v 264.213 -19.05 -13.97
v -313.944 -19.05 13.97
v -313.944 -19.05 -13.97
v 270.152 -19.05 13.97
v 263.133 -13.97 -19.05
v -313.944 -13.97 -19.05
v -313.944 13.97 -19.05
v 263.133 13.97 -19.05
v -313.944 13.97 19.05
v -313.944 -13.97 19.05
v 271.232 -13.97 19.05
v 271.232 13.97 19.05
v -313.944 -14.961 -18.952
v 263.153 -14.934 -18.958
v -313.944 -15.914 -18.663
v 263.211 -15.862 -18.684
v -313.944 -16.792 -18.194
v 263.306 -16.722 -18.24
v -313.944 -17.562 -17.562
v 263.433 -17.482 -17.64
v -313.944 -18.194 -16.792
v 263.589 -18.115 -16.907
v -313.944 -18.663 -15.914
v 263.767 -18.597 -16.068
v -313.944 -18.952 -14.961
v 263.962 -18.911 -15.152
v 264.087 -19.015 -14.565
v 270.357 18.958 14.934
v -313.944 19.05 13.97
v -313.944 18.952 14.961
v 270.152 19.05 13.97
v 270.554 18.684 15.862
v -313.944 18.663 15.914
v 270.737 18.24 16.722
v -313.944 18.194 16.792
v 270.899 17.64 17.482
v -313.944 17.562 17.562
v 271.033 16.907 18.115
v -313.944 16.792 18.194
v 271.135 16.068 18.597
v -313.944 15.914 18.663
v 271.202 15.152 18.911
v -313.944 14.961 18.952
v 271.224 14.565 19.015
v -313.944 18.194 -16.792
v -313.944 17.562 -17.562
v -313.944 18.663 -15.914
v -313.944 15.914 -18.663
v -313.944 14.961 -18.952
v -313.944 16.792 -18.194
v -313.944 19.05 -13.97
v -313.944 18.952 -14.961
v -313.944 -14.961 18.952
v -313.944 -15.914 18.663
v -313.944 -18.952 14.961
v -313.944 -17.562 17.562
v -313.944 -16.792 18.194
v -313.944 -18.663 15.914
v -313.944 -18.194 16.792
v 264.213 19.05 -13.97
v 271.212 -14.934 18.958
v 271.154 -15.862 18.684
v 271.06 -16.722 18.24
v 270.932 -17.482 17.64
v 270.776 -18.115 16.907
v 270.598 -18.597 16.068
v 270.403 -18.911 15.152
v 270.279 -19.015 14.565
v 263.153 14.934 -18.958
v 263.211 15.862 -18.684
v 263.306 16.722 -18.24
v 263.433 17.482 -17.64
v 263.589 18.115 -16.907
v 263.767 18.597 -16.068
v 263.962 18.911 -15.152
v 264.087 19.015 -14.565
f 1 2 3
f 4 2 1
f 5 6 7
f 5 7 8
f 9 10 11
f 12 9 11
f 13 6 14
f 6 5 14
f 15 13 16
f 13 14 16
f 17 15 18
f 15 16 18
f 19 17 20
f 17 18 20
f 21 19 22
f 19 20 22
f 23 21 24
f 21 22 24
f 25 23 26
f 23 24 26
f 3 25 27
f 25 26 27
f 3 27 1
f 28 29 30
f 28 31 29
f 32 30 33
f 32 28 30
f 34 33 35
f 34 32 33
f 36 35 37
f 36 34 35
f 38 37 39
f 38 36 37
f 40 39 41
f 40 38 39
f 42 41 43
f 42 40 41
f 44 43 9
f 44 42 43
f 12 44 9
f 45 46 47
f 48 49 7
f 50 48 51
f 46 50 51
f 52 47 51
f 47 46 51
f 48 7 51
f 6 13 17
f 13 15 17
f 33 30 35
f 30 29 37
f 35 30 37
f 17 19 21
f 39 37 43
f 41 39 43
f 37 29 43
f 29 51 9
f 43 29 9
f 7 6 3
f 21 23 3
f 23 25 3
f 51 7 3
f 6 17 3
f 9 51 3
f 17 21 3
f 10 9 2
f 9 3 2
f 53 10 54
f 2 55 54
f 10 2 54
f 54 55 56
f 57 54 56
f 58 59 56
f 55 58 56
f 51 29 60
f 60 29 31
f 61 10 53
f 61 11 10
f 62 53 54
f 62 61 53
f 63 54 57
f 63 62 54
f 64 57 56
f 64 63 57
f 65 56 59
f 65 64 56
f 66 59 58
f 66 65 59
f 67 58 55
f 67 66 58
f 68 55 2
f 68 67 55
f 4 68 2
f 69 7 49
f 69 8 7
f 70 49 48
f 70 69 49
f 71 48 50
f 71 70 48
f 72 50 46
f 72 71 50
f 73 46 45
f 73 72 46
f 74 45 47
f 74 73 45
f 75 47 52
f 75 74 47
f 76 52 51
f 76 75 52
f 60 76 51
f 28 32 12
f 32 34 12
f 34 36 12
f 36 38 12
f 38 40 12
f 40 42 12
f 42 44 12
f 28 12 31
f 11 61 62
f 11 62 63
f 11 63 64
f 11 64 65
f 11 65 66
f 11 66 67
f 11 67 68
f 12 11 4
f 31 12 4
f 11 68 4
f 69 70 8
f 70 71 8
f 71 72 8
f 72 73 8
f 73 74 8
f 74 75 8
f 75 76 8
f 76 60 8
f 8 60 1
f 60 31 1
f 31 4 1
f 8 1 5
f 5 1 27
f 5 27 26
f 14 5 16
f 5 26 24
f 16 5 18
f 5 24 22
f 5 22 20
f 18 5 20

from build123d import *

# Parameters (mm, degrees)
F0_W     = 627.888
F0_H     = 38.1
F1_DEPTH = 19.05
F3_DEPTH = 38.101
F4_R     = 5.08


with BuildPart() as f1:
    # F0 (on Front) → F1 (new body, symmetric)
    with BuildSketch(Plane.XZ):
        Rectangle(F0_W, F0_H)
    extrude(amount=F1_DEPTH, both=True)

    # F2 (on face) → F3 (cut, through all)
    with BuildSketch(Plane.XZ.offset(19.05)):
        Polygon((313.944, 19.05), (271.231802, 19.05), (263.133398, -19.05), (313.944, -19.05), align=None)
    extrude(amount=-F3_DEPTH, mode=Mode.SUBTRACT)

    # F4
    f4_edges = [f1.edges().sort_by_distance(p)[0] for p in [
        (-21.356099, -19.05, 19.05),
        (-25.405301, -19.05, -19.05),
        (-21.356099, 19.05, 19.05),
        (-25.405301, 19.05, -19.05),
    ]]
    fillet(f4_edges, radius=F4_R)


solid = f1.part
